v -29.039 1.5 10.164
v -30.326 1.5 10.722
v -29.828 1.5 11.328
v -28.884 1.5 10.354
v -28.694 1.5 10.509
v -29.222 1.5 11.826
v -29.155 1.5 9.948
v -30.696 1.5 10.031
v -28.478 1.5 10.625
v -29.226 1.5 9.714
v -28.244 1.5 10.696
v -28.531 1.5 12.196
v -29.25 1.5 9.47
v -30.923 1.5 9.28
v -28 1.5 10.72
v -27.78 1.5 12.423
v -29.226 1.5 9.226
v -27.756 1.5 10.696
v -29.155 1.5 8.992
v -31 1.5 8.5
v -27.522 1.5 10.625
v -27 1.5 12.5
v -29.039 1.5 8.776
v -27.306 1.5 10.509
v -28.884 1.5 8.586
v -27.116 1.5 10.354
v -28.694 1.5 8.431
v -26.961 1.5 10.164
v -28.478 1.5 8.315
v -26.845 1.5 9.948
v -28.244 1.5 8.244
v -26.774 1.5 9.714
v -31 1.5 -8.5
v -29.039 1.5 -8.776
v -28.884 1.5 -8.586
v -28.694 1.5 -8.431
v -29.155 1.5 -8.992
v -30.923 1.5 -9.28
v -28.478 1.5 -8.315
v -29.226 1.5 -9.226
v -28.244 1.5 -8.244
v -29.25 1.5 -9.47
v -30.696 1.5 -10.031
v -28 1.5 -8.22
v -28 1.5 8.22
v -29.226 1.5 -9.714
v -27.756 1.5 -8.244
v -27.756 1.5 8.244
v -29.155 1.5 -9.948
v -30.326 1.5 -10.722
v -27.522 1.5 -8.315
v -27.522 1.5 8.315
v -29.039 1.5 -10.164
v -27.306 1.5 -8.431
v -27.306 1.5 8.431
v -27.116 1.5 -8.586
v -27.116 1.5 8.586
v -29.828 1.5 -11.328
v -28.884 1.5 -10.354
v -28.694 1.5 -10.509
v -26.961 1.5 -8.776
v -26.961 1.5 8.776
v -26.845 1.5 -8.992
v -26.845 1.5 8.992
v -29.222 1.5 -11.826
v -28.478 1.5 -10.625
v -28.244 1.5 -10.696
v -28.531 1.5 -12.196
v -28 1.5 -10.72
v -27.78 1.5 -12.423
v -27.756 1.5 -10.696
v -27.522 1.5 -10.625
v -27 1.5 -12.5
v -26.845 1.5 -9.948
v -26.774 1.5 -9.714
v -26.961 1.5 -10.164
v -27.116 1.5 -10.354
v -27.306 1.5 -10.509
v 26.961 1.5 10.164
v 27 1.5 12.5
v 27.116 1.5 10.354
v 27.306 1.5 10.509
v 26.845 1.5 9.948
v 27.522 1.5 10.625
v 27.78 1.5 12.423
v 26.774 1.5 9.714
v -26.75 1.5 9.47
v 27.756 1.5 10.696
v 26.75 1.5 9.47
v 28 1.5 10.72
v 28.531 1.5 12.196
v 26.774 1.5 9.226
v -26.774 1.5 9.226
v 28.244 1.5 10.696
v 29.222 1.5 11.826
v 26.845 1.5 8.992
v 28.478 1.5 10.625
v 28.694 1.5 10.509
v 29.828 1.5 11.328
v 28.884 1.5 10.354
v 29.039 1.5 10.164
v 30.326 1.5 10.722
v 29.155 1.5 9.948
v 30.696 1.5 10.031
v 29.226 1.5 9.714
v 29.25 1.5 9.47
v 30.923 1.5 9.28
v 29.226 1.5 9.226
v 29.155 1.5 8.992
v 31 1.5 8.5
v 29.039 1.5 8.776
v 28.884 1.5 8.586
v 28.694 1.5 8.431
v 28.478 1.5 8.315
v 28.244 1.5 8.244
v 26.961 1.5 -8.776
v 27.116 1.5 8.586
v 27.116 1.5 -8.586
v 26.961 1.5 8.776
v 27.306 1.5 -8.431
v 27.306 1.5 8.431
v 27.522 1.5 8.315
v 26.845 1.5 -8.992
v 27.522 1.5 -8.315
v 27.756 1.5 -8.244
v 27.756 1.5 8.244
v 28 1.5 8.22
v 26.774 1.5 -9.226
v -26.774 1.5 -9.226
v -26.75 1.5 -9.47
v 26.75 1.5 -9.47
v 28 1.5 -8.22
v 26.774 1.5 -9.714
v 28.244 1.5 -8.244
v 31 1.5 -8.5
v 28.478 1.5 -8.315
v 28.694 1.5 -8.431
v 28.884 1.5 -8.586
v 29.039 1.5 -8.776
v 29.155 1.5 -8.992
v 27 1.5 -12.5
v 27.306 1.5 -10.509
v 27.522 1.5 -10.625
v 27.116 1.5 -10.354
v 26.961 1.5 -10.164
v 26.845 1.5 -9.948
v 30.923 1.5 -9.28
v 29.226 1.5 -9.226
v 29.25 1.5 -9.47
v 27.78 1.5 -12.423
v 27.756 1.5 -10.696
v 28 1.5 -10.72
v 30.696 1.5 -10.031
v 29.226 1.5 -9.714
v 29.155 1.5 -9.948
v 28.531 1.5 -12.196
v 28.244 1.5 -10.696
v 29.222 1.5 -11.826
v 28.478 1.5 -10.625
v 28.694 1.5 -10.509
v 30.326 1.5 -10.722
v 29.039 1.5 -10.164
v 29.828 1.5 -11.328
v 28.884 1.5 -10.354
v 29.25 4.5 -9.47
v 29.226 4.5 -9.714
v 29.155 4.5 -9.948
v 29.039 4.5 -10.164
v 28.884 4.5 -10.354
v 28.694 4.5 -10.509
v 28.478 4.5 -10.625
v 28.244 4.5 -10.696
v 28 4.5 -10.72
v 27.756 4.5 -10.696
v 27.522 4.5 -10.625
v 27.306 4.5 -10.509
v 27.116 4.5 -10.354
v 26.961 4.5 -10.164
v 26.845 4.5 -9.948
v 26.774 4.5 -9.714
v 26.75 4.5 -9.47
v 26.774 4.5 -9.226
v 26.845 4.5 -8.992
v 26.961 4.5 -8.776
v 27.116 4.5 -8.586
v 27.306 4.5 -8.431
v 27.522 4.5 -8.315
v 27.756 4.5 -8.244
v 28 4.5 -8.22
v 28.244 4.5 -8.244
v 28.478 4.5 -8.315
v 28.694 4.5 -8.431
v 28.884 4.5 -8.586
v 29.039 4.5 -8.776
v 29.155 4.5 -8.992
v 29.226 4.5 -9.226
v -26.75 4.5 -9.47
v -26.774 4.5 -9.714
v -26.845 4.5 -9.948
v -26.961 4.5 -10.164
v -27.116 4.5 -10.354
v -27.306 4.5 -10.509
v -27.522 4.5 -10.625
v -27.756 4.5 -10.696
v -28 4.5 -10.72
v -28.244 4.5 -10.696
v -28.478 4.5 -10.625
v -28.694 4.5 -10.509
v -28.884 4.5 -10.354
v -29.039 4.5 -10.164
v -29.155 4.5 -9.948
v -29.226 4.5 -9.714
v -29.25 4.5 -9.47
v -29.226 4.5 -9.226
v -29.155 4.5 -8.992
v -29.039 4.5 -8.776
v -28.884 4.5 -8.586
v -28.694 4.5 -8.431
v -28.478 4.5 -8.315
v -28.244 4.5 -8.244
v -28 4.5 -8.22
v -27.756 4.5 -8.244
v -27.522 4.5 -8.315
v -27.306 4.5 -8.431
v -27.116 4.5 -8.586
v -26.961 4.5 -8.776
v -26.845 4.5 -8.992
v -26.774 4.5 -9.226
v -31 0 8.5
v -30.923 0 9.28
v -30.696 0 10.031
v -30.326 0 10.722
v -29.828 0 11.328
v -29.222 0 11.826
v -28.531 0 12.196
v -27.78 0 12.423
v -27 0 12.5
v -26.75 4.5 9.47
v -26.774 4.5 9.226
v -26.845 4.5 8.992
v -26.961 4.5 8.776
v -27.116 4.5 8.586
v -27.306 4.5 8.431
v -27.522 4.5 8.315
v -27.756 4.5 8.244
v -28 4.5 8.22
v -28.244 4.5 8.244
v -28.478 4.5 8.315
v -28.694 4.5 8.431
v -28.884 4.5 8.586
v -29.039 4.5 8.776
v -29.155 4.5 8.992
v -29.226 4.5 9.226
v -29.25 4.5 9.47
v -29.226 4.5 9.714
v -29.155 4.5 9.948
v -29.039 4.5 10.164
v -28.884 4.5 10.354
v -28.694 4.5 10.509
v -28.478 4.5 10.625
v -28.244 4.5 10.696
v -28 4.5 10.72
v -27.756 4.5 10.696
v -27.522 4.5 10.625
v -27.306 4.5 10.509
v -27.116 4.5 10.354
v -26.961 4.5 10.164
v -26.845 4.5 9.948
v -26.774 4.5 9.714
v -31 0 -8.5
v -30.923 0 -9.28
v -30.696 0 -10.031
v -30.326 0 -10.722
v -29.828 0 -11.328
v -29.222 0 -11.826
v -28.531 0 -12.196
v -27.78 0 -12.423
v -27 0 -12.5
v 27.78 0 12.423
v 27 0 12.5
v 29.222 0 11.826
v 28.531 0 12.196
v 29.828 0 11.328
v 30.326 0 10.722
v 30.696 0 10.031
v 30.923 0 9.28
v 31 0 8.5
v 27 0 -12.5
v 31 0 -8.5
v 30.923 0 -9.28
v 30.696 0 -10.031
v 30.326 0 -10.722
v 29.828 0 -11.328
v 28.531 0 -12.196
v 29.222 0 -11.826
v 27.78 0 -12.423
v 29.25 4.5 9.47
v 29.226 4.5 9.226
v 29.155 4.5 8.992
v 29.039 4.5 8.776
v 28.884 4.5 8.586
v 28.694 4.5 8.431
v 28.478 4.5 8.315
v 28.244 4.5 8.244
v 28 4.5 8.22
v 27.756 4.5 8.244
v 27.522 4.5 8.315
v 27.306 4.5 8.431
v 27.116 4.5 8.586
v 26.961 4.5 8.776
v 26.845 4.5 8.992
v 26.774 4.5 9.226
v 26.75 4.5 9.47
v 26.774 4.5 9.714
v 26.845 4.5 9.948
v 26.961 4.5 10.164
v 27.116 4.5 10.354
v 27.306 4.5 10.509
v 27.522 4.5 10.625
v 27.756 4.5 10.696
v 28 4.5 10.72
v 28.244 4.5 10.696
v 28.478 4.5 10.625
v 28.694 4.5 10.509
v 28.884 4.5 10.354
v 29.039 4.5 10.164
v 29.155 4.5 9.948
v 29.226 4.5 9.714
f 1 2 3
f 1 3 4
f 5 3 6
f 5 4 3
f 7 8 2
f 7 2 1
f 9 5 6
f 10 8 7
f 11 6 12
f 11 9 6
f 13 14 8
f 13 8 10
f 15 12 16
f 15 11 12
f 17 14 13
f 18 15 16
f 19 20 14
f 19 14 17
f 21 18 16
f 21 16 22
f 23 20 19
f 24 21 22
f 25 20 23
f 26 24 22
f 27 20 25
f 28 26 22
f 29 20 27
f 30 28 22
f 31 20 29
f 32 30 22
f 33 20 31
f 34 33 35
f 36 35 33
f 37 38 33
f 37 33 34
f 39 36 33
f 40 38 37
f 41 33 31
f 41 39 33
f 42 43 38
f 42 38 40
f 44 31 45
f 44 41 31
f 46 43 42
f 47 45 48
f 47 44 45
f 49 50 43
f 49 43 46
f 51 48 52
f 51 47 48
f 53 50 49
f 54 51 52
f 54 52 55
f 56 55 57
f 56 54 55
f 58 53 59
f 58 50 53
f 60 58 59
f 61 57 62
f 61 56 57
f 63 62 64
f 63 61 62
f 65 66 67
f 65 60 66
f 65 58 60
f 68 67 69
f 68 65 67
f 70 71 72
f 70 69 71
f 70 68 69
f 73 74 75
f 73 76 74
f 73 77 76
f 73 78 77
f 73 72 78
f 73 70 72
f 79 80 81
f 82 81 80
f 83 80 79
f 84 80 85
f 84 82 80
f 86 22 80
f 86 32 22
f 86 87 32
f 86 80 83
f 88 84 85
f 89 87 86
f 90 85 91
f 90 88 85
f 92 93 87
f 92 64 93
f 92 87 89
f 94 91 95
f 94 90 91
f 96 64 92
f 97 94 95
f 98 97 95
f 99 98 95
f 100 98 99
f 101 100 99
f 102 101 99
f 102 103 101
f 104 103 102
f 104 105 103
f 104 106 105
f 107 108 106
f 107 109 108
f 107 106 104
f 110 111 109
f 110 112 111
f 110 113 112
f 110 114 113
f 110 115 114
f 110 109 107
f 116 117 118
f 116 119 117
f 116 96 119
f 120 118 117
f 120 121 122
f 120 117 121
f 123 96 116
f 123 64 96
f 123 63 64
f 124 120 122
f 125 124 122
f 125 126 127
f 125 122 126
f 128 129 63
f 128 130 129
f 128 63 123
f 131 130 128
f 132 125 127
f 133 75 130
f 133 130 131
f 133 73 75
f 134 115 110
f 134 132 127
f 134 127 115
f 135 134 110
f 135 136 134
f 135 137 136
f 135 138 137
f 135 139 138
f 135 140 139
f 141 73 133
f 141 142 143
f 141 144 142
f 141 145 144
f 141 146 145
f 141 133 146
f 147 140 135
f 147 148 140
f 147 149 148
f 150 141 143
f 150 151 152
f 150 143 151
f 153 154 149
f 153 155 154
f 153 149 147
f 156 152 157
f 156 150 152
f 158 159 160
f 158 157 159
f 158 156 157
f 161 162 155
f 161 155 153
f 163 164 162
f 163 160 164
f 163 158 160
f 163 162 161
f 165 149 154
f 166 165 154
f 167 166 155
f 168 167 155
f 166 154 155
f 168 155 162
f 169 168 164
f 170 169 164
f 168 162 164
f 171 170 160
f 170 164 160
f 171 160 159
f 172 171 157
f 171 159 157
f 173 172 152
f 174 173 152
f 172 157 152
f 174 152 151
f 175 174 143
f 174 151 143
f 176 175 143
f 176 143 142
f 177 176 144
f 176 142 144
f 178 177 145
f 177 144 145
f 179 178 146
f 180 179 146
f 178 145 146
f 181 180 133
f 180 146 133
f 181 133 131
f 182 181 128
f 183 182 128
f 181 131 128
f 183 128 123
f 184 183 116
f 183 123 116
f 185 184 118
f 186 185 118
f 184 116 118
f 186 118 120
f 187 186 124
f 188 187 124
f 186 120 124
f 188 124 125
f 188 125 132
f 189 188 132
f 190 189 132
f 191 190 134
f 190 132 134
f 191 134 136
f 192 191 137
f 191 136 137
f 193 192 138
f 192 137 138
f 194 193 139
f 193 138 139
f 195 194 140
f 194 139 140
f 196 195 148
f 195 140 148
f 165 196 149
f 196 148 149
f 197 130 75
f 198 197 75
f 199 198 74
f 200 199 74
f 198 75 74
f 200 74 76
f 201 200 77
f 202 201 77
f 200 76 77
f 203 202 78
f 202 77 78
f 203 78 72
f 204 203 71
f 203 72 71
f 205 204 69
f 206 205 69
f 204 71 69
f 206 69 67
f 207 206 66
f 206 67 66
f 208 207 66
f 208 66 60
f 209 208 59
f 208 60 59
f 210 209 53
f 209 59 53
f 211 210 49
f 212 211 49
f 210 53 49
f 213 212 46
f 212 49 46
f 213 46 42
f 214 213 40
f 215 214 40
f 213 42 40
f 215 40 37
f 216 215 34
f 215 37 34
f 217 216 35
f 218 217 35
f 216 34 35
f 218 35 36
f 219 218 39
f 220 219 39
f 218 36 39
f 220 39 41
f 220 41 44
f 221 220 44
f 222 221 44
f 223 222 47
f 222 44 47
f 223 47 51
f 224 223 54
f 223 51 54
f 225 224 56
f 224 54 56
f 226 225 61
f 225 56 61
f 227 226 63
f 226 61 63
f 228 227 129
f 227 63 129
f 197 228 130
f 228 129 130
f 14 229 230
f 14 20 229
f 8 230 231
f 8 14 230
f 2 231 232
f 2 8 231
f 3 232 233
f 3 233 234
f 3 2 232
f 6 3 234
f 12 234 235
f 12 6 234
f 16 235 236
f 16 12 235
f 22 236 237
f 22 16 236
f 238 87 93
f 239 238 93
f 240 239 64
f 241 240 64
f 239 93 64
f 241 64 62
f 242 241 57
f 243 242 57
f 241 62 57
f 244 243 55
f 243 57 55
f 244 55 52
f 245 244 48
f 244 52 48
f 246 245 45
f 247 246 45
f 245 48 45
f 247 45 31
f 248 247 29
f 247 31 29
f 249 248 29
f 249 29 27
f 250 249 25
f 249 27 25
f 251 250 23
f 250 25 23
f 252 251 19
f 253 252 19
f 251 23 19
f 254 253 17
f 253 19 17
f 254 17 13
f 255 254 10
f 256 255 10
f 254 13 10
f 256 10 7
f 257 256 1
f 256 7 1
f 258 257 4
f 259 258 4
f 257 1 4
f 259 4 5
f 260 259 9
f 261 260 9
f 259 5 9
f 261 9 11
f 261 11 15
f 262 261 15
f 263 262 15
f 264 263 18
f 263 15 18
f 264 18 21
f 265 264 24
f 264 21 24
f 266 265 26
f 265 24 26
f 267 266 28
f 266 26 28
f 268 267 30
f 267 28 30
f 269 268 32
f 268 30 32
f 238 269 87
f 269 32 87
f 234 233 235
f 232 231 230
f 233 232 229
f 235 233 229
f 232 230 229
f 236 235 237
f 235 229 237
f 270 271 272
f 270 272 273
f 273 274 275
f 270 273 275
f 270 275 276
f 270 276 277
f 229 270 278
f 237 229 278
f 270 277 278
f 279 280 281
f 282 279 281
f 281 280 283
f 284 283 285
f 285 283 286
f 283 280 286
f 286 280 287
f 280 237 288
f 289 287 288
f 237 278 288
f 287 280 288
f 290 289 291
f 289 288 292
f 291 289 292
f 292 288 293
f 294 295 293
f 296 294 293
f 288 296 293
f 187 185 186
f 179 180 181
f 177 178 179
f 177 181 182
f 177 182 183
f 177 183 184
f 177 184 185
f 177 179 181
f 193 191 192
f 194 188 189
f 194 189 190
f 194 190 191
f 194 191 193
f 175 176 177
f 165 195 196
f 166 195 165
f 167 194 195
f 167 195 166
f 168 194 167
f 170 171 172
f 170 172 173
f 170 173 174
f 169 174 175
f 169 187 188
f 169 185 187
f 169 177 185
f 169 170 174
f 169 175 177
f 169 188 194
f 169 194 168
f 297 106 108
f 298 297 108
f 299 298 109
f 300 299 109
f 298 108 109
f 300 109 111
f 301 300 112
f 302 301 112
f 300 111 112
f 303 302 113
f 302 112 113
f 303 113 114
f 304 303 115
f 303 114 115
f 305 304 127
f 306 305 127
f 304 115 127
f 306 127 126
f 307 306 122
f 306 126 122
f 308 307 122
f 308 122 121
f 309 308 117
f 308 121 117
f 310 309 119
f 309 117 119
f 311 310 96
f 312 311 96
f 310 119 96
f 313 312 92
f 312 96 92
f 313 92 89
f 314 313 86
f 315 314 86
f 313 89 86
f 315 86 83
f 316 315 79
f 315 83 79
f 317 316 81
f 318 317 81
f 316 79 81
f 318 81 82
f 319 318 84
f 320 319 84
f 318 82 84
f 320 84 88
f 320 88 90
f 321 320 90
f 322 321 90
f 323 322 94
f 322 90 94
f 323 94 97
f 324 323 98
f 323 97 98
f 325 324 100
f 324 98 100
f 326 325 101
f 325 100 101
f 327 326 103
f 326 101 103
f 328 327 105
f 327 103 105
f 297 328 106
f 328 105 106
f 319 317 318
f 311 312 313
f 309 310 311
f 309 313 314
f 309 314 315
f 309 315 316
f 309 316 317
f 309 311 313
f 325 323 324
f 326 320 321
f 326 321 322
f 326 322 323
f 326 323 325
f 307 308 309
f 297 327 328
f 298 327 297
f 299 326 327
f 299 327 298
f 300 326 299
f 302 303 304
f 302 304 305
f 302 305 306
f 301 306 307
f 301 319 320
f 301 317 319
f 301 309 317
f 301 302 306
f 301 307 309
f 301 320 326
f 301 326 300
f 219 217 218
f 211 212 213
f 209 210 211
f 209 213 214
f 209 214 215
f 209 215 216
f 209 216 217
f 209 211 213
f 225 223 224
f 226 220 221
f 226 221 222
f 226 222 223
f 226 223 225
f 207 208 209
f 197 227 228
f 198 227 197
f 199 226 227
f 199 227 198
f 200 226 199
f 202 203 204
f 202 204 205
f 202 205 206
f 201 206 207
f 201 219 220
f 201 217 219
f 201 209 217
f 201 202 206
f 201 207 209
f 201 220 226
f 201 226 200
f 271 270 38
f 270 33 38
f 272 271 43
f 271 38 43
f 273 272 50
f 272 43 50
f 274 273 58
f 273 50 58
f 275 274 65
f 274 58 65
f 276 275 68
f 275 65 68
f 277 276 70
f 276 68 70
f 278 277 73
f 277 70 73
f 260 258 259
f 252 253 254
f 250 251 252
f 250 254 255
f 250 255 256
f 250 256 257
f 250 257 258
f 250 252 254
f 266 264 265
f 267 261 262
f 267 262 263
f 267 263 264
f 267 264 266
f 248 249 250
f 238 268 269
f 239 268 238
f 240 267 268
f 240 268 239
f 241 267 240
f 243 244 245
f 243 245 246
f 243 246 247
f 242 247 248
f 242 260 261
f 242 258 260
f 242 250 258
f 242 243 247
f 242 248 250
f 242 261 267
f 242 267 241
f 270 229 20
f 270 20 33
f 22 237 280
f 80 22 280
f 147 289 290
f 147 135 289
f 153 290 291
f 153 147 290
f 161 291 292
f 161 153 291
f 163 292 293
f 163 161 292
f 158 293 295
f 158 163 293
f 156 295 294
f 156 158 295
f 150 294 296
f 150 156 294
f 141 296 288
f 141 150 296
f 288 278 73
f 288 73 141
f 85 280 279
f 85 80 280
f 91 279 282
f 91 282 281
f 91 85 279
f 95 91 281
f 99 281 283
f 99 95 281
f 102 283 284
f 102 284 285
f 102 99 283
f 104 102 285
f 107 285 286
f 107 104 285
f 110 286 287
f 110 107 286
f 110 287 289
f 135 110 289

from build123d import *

# Parameters (mm, degrees)
CROQUIS1_W              = 62
CROQUIS1_H              = 25
SALIENTE_EXTRUIR1_DEPTH = 1.5
REDONDEO1_R             = 4
CROQUIS2_R              = 1.25
SALIENTE_EXTRUIR2_DEPTH = 3


with BuildPart() as part:
    # Croquis1 → Saliente-Extruir1 (new body)
    with BuildSketch(Plane(origin=(0, 0, 0), x_dir=(1, 0, 0), z_dir=(0, 1, 0))):
        Rectangle(CROQUIS1_W, CROQUIS1_H)
    extrude(amount=SALIENTE_EXTRUIR1_DEPTH)

    # Redondeo1
    redondeo1_edges = [part.edges().sort_by_distance(p)[0] for p in [
        (31, 0.75, 12.5),
        (-31, 0.75, 12.5),
        (-31, 0.75, -12.5),
        (31, 0.75, -12.5),
    ]]
    fillet(redondeo1_edges, radius=REDONDEO1_R)

    # Croquis2 → Saliente-Extruir2 (add)
    with BuildSketch(Plane(origin=(0, 1.5, 0), x_dir=(1, 0, 0), z_dir=(0, 1, 0))):
        with Locations((-28, 9.47)):
            Circle(CROQUIS2_R)
        with Locations((28, 9.47)):
            Circle(CROQUIS2_R)
        with Locations((28, -9.47)):
            Circle(CROQUIS2_R)
        with Locations((-28, -9.47)):
            Circle(CROQUIS2_R)
    extrude(amount=SALIENTE_EXTRUIR2_DEPTH)


solid = part.part
